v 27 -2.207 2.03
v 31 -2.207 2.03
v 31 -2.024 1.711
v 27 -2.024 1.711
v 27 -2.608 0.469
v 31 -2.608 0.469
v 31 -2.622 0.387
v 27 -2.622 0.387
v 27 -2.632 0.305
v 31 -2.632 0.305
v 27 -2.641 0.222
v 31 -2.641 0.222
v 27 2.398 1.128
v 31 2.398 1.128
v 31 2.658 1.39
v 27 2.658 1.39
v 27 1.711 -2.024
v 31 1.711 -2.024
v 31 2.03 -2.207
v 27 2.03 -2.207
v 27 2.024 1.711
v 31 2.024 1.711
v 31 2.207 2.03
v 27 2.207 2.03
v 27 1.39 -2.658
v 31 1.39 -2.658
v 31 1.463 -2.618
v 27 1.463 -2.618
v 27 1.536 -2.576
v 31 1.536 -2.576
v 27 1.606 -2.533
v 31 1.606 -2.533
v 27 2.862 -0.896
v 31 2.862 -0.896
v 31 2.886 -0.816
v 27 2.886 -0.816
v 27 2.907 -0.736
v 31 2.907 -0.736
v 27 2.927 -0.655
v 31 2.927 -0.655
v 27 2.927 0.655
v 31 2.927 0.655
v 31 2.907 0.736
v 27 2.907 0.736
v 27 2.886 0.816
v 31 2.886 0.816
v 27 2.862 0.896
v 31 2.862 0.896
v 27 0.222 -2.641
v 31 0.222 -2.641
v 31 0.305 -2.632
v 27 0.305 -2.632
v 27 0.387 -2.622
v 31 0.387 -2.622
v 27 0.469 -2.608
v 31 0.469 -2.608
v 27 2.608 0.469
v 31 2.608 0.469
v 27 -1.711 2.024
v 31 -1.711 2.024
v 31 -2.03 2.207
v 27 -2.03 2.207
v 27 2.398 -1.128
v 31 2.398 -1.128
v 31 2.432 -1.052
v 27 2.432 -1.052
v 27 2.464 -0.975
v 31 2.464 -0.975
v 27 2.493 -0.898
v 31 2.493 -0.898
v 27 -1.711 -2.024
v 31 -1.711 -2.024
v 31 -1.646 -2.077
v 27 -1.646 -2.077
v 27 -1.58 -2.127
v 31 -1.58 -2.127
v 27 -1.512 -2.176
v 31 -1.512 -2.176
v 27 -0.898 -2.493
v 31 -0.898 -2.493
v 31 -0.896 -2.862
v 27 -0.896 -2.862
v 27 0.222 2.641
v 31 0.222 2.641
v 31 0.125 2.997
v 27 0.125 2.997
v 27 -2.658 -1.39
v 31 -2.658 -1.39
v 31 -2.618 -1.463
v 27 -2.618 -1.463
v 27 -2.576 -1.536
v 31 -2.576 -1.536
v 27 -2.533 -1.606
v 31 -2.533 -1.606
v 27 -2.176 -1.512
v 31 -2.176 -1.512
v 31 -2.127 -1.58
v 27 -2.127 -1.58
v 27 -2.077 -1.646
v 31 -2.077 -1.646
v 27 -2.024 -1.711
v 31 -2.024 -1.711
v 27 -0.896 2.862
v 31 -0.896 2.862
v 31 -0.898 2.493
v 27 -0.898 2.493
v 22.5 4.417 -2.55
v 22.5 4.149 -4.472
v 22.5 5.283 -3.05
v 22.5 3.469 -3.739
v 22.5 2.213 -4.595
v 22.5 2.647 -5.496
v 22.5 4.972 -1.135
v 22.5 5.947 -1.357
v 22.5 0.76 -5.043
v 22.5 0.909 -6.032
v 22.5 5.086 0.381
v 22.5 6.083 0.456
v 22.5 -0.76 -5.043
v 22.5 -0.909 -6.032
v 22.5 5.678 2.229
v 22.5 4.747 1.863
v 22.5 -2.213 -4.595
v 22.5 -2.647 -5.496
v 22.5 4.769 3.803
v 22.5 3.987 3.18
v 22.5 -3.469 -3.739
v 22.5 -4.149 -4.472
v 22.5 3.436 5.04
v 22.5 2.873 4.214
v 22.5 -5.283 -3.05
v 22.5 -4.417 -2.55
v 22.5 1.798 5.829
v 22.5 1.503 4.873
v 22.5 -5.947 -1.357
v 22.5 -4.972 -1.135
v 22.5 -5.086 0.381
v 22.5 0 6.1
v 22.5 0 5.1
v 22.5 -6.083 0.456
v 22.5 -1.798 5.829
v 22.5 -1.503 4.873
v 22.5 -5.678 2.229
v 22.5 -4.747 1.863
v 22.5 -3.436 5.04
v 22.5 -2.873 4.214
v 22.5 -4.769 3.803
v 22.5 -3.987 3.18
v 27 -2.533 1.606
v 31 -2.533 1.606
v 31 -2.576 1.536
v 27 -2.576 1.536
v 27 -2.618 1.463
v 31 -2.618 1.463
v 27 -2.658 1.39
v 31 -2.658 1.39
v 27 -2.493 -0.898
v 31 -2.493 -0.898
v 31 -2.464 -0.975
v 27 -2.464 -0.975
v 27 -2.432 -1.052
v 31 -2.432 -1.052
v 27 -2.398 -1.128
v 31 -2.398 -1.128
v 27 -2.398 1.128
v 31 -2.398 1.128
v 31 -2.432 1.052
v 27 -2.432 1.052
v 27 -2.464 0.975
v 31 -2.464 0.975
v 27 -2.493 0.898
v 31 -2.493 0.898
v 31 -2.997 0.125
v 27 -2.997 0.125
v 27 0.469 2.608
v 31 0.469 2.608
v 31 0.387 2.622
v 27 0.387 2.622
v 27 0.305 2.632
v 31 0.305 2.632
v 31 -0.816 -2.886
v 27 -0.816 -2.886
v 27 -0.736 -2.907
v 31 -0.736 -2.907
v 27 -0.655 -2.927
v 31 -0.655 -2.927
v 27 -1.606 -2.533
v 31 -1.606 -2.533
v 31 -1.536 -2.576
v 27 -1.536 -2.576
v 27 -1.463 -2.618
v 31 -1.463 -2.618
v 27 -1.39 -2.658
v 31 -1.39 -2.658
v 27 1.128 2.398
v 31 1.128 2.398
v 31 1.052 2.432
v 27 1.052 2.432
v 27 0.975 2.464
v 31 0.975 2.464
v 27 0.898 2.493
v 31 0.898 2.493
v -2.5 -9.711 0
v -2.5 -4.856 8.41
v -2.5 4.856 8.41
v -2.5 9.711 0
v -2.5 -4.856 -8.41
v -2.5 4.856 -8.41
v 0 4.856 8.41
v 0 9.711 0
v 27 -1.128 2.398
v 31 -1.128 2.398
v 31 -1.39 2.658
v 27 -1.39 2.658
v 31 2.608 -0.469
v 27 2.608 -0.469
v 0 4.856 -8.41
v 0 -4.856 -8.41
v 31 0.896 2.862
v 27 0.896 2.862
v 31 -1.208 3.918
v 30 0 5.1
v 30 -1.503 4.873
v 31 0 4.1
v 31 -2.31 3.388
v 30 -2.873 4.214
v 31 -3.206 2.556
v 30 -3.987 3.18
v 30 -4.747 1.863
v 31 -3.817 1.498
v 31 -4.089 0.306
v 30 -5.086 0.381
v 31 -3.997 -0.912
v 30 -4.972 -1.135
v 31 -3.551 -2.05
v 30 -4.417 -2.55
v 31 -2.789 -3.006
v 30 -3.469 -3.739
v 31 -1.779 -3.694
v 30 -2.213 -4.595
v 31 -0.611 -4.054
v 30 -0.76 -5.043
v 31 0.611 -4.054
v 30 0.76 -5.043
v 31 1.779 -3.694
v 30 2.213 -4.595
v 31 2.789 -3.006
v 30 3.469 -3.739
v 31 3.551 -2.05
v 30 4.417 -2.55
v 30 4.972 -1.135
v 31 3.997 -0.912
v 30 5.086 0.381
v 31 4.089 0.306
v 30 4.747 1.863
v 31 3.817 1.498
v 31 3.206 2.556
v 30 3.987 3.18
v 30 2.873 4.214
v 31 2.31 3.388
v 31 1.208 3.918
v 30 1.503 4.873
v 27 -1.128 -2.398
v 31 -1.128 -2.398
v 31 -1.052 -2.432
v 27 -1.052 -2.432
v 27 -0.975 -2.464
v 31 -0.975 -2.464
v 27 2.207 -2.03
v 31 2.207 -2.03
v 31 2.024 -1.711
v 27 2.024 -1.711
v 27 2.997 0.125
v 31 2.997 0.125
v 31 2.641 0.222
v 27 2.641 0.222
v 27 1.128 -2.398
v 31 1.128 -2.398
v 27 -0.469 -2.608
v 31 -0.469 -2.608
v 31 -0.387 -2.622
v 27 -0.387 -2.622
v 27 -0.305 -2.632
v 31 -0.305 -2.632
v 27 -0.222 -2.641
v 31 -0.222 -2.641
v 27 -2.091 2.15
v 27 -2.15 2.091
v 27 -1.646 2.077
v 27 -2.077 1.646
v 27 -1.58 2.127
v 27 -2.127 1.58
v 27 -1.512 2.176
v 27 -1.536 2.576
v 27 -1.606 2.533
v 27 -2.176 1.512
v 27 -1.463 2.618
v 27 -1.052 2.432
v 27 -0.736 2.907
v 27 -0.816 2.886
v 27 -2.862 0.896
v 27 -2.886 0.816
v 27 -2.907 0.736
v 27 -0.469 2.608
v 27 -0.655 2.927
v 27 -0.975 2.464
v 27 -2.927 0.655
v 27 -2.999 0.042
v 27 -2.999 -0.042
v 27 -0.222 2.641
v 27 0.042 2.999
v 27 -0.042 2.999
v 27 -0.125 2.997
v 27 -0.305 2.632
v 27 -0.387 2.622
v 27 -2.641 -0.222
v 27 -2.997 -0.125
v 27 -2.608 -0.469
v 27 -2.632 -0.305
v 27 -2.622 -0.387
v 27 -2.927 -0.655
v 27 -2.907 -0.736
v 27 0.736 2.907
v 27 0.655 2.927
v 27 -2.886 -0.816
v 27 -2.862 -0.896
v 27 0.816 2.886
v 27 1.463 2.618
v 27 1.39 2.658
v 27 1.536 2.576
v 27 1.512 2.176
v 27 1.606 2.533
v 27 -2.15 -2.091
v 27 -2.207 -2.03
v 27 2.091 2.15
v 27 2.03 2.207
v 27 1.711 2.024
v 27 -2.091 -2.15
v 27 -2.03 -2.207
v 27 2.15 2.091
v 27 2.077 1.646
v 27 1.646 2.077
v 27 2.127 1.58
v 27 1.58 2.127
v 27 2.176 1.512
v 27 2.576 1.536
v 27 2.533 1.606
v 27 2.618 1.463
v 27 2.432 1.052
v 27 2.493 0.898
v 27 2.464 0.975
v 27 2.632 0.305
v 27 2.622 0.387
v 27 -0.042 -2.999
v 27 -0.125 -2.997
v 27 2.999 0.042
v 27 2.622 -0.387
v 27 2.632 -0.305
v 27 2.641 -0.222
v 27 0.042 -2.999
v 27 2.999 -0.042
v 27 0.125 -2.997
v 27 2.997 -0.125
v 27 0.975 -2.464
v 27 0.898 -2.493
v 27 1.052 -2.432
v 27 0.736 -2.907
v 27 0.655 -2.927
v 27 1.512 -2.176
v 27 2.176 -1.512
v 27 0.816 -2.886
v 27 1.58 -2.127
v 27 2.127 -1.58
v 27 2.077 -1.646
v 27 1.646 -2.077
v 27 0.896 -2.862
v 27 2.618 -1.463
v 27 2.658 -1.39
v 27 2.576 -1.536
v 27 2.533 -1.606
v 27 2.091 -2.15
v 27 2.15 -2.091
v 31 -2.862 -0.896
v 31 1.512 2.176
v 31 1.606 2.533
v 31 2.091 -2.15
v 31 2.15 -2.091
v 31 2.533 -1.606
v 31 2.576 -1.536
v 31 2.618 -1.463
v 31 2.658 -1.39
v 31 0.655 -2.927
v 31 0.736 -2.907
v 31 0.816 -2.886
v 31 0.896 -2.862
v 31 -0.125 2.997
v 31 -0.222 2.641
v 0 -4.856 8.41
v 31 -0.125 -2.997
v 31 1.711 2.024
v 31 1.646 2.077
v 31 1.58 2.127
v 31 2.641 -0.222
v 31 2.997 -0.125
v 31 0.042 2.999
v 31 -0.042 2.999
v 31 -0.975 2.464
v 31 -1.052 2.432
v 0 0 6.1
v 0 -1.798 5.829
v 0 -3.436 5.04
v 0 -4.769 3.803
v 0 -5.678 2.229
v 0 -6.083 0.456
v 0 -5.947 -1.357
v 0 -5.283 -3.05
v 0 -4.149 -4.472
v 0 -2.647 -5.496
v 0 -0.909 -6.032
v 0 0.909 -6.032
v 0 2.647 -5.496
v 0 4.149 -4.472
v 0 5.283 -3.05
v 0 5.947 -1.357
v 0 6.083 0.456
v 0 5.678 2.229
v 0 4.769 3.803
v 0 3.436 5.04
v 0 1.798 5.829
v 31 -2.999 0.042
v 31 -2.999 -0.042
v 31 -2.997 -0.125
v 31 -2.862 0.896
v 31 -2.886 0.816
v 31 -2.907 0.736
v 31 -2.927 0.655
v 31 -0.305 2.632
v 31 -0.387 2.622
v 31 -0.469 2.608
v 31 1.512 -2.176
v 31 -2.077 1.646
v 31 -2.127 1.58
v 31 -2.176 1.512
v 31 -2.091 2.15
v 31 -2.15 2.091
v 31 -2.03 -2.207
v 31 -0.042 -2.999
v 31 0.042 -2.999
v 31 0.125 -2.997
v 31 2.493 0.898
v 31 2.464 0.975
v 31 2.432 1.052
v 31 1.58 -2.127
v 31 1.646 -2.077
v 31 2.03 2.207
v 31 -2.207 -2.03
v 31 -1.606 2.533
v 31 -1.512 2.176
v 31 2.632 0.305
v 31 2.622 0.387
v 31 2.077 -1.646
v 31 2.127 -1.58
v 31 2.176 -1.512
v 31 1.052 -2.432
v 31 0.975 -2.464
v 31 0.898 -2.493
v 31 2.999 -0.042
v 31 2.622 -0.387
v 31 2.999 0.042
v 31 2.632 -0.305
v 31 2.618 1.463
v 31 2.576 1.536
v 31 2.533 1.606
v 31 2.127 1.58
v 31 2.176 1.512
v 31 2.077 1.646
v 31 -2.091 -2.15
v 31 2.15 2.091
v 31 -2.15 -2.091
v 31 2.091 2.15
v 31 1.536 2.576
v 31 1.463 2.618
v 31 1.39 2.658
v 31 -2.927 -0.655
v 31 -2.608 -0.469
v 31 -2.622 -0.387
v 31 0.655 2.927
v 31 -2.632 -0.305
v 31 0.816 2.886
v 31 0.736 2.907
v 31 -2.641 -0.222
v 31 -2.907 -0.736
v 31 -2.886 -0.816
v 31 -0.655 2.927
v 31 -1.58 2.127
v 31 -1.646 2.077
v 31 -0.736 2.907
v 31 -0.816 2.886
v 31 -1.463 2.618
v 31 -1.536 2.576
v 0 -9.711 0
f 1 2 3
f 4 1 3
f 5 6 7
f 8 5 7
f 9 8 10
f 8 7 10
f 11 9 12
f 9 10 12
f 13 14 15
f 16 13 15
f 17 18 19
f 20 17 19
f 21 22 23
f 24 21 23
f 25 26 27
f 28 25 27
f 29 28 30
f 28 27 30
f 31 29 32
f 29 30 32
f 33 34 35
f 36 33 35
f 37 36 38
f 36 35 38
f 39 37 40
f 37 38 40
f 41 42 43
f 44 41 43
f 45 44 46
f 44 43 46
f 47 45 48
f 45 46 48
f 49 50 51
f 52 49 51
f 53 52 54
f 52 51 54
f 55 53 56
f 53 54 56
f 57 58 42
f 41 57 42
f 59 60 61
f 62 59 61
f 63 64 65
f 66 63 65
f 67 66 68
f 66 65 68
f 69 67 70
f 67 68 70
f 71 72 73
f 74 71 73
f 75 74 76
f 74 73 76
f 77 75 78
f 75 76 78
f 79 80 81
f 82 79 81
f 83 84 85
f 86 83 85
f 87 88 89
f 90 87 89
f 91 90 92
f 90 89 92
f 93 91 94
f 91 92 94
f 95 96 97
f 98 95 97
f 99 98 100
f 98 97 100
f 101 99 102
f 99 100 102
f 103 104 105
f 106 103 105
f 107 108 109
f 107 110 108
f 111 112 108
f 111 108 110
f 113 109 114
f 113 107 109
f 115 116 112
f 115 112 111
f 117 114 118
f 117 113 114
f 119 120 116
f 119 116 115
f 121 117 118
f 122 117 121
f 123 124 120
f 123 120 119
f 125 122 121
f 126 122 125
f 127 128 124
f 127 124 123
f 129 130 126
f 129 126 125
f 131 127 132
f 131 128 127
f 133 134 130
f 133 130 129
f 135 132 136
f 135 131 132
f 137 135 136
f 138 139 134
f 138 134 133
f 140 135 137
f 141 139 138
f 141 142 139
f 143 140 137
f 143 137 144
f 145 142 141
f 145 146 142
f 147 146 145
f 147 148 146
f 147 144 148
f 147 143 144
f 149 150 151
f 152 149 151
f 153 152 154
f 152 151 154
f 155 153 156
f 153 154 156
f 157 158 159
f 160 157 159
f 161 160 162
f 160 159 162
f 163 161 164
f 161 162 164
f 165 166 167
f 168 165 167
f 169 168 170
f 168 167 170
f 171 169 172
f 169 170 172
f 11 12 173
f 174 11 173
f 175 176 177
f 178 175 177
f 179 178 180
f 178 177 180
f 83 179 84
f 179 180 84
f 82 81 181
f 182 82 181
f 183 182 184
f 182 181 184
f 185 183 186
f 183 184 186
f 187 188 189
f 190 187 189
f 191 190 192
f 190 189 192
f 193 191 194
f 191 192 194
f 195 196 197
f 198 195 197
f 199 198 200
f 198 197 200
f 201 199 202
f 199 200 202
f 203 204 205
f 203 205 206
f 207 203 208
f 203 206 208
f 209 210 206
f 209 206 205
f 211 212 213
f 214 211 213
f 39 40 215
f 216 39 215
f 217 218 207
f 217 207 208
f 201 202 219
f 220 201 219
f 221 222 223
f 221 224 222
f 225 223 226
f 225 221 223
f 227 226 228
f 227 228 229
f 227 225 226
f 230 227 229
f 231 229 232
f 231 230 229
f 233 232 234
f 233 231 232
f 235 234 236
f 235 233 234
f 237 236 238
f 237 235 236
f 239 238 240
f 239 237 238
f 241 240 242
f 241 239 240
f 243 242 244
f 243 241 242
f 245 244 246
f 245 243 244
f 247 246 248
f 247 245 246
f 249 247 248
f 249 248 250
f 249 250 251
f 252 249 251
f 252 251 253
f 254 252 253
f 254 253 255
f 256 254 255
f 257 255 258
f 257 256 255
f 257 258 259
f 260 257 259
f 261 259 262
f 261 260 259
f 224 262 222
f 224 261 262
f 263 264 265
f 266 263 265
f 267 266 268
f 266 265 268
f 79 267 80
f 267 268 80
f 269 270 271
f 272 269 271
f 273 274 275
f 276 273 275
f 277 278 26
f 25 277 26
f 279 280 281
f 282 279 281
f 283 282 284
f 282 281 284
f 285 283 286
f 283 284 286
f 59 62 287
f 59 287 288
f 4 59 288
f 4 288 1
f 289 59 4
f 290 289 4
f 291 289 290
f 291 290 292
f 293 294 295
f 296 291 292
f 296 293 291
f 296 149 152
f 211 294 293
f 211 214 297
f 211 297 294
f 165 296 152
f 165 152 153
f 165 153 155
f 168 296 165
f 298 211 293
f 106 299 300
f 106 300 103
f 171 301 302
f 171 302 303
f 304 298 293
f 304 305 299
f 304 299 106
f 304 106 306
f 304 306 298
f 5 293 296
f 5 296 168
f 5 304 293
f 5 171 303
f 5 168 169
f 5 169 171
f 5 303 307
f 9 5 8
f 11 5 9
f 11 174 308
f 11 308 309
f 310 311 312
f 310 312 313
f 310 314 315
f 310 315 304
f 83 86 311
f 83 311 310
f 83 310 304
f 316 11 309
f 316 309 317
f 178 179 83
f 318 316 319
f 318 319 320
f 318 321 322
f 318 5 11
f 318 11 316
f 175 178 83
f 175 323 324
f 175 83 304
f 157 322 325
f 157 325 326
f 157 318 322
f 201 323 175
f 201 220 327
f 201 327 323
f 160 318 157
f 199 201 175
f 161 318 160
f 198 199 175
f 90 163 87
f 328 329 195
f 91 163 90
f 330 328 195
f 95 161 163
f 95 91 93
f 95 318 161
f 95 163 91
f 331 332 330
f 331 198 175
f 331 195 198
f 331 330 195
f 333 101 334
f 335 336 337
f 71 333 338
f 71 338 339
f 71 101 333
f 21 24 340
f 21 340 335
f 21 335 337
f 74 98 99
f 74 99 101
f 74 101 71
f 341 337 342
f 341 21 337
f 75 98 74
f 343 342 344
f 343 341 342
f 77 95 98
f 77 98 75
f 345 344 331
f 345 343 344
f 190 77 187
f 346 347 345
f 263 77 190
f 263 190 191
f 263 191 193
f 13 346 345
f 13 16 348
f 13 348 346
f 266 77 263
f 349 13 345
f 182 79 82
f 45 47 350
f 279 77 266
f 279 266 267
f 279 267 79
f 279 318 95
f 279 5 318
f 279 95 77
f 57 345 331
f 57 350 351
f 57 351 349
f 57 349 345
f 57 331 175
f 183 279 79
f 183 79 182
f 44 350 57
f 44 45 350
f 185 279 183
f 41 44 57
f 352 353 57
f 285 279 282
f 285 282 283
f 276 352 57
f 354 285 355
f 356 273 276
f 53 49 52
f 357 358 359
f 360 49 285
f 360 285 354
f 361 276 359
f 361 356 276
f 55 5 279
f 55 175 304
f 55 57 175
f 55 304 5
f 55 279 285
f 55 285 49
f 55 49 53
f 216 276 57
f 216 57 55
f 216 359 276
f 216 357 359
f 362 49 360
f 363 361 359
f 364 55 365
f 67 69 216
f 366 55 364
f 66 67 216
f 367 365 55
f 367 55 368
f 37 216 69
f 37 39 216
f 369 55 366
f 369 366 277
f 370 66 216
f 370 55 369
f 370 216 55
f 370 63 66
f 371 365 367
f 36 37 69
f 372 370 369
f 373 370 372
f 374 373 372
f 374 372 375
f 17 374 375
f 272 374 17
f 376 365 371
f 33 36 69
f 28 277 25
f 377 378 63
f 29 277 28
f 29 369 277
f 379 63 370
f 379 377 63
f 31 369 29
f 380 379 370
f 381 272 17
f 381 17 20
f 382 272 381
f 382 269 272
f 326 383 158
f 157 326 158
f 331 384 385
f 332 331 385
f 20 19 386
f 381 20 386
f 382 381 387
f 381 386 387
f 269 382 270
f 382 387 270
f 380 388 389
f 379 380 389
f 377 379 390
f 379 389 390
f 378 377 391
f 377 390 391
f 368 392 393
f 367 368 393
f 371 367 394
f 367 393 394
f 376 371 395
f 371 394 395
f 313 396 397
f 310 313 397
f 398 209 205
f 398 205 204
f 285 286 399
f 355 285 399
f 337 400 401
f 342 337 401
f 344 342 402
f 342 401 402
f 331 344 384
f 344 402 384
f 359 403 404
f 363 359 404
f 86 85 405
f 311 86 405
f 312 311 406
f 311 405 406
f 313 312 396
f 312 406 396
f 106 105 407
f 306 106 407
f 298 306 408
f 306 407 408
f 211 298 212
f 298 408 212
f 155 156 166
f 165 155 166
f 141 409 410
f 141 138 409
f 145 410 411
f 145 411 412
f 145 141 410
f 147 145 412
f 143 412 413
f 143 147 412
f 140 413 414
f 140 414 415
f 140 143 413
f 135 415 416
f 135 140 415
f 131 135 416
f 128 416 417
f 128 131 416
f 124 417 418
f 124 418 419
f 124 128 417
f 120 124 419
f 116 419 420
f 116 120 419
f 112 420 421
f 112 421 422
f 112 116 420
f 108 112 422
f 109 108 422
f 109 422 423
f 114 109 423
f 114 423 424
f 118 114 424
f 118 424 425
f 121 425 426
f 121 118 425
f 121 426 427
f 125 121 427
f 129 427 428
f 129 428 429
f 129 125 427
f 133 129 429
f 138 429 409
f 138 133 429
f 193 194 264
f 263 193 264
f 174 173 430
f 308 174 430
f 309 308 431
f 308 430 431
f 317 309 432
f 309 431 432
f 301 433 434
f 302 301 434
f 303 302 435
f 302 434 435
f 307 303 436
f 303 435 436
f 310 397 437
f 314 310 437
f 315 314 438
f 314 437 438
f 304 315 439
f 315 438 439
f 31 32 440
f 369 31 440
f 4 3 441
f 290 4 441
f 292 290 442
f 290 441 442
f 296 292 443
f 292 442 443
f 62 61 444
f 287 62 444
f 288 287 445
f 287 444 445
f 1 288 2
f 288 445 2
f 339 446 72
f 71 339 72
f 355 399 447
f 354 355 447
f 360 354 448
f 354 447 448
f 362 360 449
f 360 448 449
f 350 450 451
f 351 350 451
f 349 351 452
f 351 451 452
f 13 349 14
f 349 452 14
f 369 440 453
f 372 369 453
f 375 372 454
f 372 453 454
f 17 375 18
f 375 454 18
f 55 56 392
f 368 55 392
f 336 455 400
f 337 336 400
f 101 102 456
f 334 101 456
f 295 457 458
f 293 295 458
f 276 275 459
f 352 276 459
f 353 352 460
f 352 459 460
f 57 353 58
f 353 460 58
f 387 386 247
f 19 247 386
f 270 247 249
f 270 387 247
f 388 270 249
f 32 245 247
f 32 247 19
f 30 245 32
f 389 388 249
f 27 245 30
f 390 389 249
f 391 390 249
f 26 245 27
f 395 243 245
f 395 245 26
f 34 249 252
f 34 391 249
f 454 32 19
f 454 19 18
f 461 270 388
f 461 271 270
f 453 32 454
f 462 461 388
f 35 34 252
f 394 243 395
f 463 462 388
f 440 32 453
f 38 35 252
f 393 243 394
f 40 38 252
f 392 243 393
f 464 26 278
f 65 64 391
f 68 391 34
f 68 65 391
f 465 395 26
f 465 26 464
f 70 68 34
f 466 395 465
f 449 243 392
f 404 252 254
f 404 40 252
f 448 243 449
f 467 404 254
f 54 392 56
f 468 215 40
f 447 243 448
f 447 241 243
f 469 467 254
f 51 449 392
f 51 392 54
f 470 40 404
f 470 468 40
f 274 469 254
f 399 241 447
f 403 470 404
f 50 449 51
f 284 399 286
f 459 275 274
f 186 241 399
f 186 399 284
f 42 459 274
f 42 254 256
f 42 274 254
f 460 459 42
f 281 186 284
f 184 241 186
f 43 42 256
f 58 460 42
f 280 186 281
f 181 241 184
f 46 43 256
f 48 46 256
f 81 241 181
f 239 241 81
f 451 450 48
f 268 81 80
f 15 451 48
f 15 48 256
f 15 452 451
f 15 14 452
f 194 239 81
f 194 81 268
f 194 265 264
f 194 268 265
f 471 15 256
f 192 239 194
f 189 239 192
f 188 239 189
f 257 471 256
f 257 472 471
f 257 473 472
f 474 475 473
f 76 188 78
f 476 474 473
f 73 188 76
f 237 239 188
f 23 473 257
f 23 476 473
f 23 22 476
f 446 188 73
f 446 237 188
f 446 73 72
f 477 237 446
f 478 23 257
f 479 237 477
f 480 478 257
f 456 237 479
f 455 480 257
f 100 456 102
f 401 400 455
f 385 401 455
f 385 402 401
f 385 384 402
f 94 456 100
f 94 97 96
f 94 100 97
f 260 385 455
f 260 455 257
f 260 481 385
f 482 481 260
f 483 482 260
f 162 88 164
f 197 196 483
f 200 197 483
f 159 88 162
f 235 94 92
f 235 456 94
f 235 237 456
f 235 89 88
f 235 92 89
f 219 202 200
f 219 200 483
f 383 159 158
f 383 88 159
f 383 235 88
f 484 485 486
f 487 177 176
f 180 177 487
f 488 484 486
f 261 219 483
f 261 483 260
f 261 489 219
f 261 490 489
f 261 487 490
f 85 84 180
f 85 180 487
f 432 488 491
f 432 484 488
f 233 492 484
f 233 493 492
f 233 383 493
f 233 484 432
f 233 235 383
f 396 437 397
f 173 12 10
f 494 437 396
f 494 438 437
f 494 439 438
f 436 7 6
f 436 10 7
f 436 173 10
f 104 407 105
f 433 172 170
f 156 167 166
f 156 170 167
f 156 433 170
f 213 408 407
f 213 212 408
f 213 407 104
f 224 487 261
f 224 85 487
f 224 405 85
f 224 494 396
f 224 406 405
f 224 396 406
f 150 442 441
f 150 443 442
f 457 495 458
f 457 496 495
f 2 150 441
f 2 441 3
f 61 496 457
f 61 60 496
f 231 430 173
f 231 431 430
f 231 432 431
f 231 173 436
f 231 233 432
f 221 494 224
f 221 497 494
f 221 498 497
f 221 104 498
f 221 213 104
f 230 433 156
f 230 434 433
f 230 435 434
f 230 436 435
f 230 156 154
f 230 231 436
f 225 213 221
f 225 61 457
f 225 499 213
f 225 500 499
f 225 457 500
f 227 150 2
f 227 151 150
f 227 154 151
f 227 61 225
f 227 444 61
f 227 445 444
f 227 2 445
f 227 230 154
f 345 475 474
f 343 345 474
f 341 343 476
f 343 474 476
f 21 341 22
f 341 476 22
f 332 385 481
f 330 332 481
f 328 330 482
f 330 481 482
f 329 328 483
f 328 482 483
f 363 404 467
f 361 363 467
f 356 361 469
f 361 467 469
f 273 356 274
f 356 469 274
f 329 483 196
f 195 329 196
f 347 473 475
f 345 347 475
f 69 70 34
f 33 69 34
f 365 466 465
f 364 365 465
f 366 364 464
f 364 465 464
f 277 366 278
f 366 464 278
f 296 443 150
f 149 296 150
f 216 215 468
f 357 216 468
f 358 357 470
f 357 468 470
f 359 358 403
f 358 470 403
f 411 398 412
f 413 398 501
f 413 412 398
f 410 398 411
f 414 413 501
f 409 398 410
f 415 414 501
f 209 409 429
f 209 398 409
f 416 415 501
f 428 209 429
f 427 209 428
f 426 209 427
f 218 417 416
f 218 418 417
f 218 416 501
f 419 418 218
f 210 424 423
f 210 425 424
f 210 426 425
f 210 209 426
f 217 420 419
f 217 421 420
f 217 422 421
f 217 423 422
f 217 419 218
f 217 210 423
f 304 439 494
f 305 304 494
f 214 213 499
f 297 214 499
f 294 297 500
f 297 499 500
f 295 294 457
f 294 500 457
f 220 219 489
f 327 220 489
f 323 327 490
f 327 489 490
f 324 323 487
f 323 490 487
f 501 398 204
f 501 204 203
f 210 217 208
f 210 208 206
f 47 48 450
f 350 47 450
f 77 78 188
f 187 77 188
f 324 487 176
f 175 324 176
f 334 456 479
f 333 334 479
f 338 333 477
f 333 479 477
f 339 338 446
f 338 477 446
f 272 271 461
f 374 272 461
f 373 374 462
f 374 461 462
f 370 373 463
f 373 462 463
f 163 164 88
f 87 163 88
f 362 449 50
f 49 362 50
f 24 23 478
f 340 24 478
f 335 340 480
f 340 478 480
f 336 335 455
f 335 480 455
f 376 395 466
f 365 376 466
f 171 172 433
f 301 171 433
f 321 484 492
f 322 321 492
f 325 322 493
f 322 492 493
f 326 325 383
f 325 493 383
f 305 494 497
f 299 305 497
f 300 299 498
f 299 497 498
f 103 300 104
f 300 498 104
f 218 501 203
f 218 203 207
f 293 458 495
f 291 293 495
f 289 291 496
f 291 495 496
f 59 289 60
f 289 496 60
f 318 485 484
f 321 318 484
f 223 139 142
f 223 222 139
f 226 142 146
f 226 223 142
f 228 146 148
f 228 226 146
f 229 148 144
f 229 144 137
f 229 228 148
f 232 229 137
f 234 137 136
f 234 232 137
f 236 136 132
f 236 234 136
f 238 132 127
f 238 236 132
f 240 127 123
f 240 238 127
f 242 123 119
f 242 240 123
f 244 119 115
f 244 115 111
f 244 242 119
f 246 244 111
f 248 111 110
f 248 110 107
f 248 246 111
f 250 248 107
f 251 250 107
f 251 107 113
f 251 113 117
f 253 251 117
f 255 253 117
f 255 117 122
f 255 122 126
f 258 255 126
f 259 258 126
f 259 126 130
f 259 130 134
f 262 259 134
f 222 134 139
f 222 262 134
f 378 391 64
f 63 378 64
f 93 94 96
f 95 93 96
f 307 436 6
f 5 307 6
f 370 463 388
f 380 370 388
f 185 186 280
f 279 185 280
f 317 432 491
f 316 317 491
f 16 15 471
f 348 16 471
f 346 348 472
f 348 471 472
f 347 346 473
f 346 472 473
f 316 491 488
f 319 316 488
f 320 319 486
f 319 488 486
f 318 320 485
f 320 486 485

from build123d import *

# Parameters (mm, degrees)
EXTRUDE_1_DEPTH     = 2.5
CUT_EXTRUDE_1_DEPTH = 4


with BuildPart() as part:
    # Эскиз1 → Бобышка-Вытянуть1 (new body)
    with BuildSketch(Plane(origin=(0, 0, 0), x_dir=(0, 0, -1), z_dir=(1, 0, 0))):
        Polygon((0, 9.711324865), (-8.410254038, 4.855662433), (-8.410254038, -4.855662433), (0, -9.711324865), (8.410254038, -4.855662433), (8.410254038, 4.855662433), align=None)
    extrude(amount=-EXTRUDE_1_DEPTH)

    # Эскиз3 → Повернуть1 (revolve)
    with BuildSketch(Plane.XY, mode=Mode.PRIVATE) as revolve_1_sk:
        Polygon((0, 0), (0, 6.1), (22.5, 6.1), (22.5, 5.1), (30, 5.1), (31, 4.1), (31, 0), align=None)
    revolve(revolve_1_sk.sketch.rotate(Axis((-6.877569373, 0, 0), (1, 0, 0)), 90), axis=Axis((-6.877569373, 0, 0), (1, 0, 0)))

    # Эскиз4 → Вырез-Вытянуть1 (cut)
    with BuildSketch(Plane(origin=(31, 0, -31), x_dir=(0, 0, 1), z_dir=(-1, 0, 0))):
        with BuildLine():
            Line((30.778386531, 2.640717227), (30.875027145, 2.996524002))
            ThreePointArc((30.875027145, 2.996524002), (31, 2.999128925), (31.124972855, 2.996524002))
            Line((31.124972855, 2.996524002), (31.221613469, 2.640717227))
            ThreePointArc((31.221613469, 2.640717227), (31.345894409, 2.627328883), (31.469405738, 2.608094755))
            Line((31.469405738, 2.608094755), (31.654842973, 2.926765277))
            ThreePointArc((31.654842973, 2.926765277), (31.776231684, 2.896936085), (31.896271989, 2.862074568))
            Line((31.896271989, 2.862074568), (31.897530084, 2.493379183))
            ThreePointArc((31.897530084, 2.493379183), (32.014111096, 2.448280761), (32.12843572, 2.397734937))
            Line((32.12843572, 2.397734937), (32.390032334, 2.657552336))
            ThreePointArc((32.390032334, 2.657552336), (32.499564462, 2.597321838), (32.606491668, 2.532579481))
            Line((32.606491668, 2.532579481), (32.512281507, 2.176121468))
            ThreePointArc((32.512281507, 2.176121468), (32.613217787, 2.102386352), (32.710564672, 2.023973445))
            Line((32.710564672, 2.023973445), (33.030493289, 2.207231595))
            ThreePointArc((33.030493289, 2.207231595), (33.1207044, 2.1207044), (33.207231595, 2.030493289))
            Line((33.207231595, 2.030493289), (33.023973445, 1.710564672))
            ThreePointArc((33.023973445, 1.710564672), (33.102386352, 1.613217787), (33.176121468, 1.512281507))
            Line((33.176121468, 1.512281507), (33.532579481, 1.606491668))
            ThreePointArc((33.532579481, 1.606491668), (33.597321838, 1.499564462), (33.657552336, 1.390032334))
            Line((33.657552336, 1.390032334), (33.397734937, 1.12843572))
            ThreePointArc((33.397734937, 1.12843572), (33.448280761, 1.014111096), (33.493379183, 0.897530084))
            Line((33.493379183, 0.897530084), (33.862074568, 0.896271989))
            ThreePointArc((33.862074568, 0.896271989), (33.896936085, 0.776231684), (33.926765277, 0.654842973))
            Line((33.926765277, 0.654842973), (33.608094755, 0.469405738))
            ThreePointArc((33.608094755, 0.469405738), (33.627328883, 0.345894409), (33.640717227, 0.221613469))
            Line((33.640717227, 0.221613469), (33.996524002, 0.124972855))
            ThreePointArc((33.996524002, 0.124972855), (33.999128925, 0), (33.996524002, -0.124972855))
            Line((33.996524002, -0.124972855), (33.640717227, -0.221613469))
            ThreePointArc((33.640717227, -0.221613469), (33.627328883, -0.345894409), (33.608094755, -0.469405738))
            Line((33.608094755, -0.469405738), (33.926765277, -0.654842973))
            ThreePointArc((33.926765277, -0.654842973), (33.896936085, -0.776231684), (33.862074568, -0.896271989))
            Line((33.862074568, -0.896271989), (33.493379183, -0.897530084))
            ThreePointArc((33.493379183, -0.897530084), (33.448280761, -1.014111096), (33.397734937, -1.12843572))
            Line((33.397734937, -1.12843572), (33.657552336, -1.390032334))
            ThreePointArc((33.657552336, -1.390032334), (33.597321838, -1.499564462), (33.532579481, -1.606491668))
            Line((33.532579481, -1.606491668), (33.176121468, -1.512281507))
            ThreePointArc((33.176121468, -1.512281507), (33.102386352, -1.613217787), (33.023973445, -1.710564672))
            Line((33.023973445, -1.710564672), (33.207231595, -2.030493289))
            ThreePointArc((33.207231595, -2.030493289), (33.1207044, -2.1207044), (33.030493289, -2.207231595))
            Line((33.030493289, -2.207231595), (32.710564672, -2.023973445))
            ThreePointArc((32.710564672, -2.023973445), (32.613217787, -2.102386352), (32.512281507, -2.176121468))
            Line((32.512281507, -2.176121468), (32.606491668, -2.532579481))
            ThreePointArc((32.606491668, -2.532579481), (32.499564462, -2.597321838), (32.390032334, -2.657552336))
            Line((32.390032334, -2.657552336), (32.12843572, -2.397734937))
            ThreePointArc((32.12843572, -2.397734937), (32.014111096, -2.448280761), (31.897530084, -2.493379183))
            Line((31.897530084, -2.493379183), (31.896271989, -2.862074568))
            ThreePointArc((31.896271989, -2.862074568), (31.776231684, -2.896936085), (31.654842973, -2.926765277))
            Line((31.654842973, -2.926765277), (31.469405738, -2.608094755))
            ThreePointArc((31.469405738, -2.608094755), (31.345894409, -2.627328883), (31.221613469, -2.640717227))
            Line((31.221613469, -2.640717227), (31.124972855, -2.996524002))
            ThreePointArc((31.124972855, -2.996524002), (31, -2.999128925), (30.875027145, -2.996524002))
            Line((30.875027145, -2.996524002), (30.778386531, -2.640717227))
            ThreePointArc((30.778386531, -2.640717227), (30.654105591, -2.627328883), (30.530594262, -2.608094755))
            Line((30.530594262, -2.608094755), (30.345157027, -2.926765277))
            ThreePointArc((30.345157027, -2.926765277), (30.223768316, -2.896936085), (30.103728011, -2.862074568))
            Line((30.103728011, -2.862074568), (30.102469916, -2.493379183))
            ThreePointArc((30.102469916, -2.493379183), (29.985888904, -2.448280761), (29.87156428, -2.397734937))
            Line((29.87156428, -2.397734937), (29.609967666, -2.657552336))
            ThreePointArc((29.609967666, -2.657552336), (29.500435538, -2.597321838), (29.393508332, -2.532579481))
            Line((29.393508332, -2.532579481), (29.487718493, -2.176121468))
            ThreePointArc((29.487718493, -2.176121468), (29.386782213, -2.102386352), (29.289435328, -2.023973445))
            Line((29.289435328, -2.023973445), (28.969506711, -2.207231595))
            ThreePointArc((28.969506711, -2.207231595), (28.8792956, -2.1207044), (28.792768405, -2.030493289))
            Line((28.792768405, -2.030493289), (28.976026555, -1.710564672))
            ThreePointArc((28.976026555, -1.710564672), (28.897613648, -1.613217787), (28.823878532, -1.512281507))
            Line((28.823878532, -1.512281507), (28.467420519, -1.606491668))
            ThreePointArc((28.467420519, -1.606491668), (28.402678162, -1.499564462), (28.342447664, -1.390032334))
            Line((28.342447664, -1.390032334), (28.602265063, -1.12843572))
            ThreePointArc((28.602265063, -1.12843572), (28.551719239, -1.014111096), (28.506620817, -0.897530084))
            Line((28.506620817, -0.897530084), (28.137925432, -0.896271989))
            ThreePointArc((28.137925432, -0.896271989), (28.103063915, -0.776231684), (28.073234723, -0.654842973))
            Line((28.073234723, -0.654842973), (28.391905245, -0.469405738))
            ThreePointArc((28.391905245, -0.469405738), (28.372671117, -0.345894409), (28.359282773, -0.221613469))
            Line((28.359282773, -0.221613469), (28.003475998, -0.124972855))
            ThreePointArc((28.003475998, -0.124972855), (28.000871075, 0), (28.003475998, 0.124972855))
            Line((28.003475998, 0.124972855), (28.359282773, 0.221613469))
            ThreePointArc((28.359282773, 0.221613469), (28.372671117, 0.345894409), (28.391905245, 0.469405738))
            Line((28.391905245, 0.469405738), (28.073234723, 0.654842973))
            ThreePointArc((28.073234723, 0.654842973), (28.103063915, 0.776231684), (28.137925432, 0.896271989))
            Line((28.137925432, 0.896271989), (28.506620817, 0.897530084))
            ThreePointArc((28.506620817, 0.897530084), (28.551719239, 1.014111096), (28.602265063, 1.12843572))
            Line((28.602265063, 1.12843572), (28.342447664, 1.390032334))
            ThreePointArc((28.342447664, 1.390032334), (28.402678162, 1.499564462), (28.467420519, 1.606491668))
            Line((28.467420519, 1.606491668), (28.823878532, 1.512281507))
            ThreePointArc((28.823878532, 1.512281507), (28.897613648, 1.613217787), (28.976026555, 1.710564672))
            Line((28.976026555, 1.710564672), (28.792768405, 2.030493289))
            ThreePointArc((28.792768405, 2.030493289), (28.8792956, 2.1207044), (28.969506711, 2.207231595))
            Line((28.969506711, 2.207231595), (29.289435328, 2.023973445))
            ThreePointArc((29.289435328, 2.023973445), (29.386782213, 2.102386352), (29.487718493, 2.176121468))
            Line((29.487718493, 2.176121468), (29.393508332, 2.532579481))
            ThreePointArc((29.393508332, 2.532579481), (29.500435538, 2.597321838), (29.609967666, 2.657552336))
            Line((29.609967666, 2.657552336), (29.87156428, 2.397734937))
            ThreePointArc((29.87156428, 2.397734937), (29.985888904, 2.448280761), (30.102469916, 2.493379183))
            Line((30.102469916, 2.493379183), (30.103728011, 2.862074568))
            ThreePointArc((30.103728011, 2.862074568), (30.223768316, 2.896936085), (30.345157027, 2.926765277))
            Line((30.345157027, 2.926765277), (30.530594262, 2.608094755))
            ThreePointArc((30.530594262, 2.608094755), (30.654105591, 2.627328883), (30.778386531, 2.640717227))
        make_face()
    extrude(amount=CUT_EXTRUDE_1_DEPTH, mode=Mode.SUBTRACT)


solid = part.part
